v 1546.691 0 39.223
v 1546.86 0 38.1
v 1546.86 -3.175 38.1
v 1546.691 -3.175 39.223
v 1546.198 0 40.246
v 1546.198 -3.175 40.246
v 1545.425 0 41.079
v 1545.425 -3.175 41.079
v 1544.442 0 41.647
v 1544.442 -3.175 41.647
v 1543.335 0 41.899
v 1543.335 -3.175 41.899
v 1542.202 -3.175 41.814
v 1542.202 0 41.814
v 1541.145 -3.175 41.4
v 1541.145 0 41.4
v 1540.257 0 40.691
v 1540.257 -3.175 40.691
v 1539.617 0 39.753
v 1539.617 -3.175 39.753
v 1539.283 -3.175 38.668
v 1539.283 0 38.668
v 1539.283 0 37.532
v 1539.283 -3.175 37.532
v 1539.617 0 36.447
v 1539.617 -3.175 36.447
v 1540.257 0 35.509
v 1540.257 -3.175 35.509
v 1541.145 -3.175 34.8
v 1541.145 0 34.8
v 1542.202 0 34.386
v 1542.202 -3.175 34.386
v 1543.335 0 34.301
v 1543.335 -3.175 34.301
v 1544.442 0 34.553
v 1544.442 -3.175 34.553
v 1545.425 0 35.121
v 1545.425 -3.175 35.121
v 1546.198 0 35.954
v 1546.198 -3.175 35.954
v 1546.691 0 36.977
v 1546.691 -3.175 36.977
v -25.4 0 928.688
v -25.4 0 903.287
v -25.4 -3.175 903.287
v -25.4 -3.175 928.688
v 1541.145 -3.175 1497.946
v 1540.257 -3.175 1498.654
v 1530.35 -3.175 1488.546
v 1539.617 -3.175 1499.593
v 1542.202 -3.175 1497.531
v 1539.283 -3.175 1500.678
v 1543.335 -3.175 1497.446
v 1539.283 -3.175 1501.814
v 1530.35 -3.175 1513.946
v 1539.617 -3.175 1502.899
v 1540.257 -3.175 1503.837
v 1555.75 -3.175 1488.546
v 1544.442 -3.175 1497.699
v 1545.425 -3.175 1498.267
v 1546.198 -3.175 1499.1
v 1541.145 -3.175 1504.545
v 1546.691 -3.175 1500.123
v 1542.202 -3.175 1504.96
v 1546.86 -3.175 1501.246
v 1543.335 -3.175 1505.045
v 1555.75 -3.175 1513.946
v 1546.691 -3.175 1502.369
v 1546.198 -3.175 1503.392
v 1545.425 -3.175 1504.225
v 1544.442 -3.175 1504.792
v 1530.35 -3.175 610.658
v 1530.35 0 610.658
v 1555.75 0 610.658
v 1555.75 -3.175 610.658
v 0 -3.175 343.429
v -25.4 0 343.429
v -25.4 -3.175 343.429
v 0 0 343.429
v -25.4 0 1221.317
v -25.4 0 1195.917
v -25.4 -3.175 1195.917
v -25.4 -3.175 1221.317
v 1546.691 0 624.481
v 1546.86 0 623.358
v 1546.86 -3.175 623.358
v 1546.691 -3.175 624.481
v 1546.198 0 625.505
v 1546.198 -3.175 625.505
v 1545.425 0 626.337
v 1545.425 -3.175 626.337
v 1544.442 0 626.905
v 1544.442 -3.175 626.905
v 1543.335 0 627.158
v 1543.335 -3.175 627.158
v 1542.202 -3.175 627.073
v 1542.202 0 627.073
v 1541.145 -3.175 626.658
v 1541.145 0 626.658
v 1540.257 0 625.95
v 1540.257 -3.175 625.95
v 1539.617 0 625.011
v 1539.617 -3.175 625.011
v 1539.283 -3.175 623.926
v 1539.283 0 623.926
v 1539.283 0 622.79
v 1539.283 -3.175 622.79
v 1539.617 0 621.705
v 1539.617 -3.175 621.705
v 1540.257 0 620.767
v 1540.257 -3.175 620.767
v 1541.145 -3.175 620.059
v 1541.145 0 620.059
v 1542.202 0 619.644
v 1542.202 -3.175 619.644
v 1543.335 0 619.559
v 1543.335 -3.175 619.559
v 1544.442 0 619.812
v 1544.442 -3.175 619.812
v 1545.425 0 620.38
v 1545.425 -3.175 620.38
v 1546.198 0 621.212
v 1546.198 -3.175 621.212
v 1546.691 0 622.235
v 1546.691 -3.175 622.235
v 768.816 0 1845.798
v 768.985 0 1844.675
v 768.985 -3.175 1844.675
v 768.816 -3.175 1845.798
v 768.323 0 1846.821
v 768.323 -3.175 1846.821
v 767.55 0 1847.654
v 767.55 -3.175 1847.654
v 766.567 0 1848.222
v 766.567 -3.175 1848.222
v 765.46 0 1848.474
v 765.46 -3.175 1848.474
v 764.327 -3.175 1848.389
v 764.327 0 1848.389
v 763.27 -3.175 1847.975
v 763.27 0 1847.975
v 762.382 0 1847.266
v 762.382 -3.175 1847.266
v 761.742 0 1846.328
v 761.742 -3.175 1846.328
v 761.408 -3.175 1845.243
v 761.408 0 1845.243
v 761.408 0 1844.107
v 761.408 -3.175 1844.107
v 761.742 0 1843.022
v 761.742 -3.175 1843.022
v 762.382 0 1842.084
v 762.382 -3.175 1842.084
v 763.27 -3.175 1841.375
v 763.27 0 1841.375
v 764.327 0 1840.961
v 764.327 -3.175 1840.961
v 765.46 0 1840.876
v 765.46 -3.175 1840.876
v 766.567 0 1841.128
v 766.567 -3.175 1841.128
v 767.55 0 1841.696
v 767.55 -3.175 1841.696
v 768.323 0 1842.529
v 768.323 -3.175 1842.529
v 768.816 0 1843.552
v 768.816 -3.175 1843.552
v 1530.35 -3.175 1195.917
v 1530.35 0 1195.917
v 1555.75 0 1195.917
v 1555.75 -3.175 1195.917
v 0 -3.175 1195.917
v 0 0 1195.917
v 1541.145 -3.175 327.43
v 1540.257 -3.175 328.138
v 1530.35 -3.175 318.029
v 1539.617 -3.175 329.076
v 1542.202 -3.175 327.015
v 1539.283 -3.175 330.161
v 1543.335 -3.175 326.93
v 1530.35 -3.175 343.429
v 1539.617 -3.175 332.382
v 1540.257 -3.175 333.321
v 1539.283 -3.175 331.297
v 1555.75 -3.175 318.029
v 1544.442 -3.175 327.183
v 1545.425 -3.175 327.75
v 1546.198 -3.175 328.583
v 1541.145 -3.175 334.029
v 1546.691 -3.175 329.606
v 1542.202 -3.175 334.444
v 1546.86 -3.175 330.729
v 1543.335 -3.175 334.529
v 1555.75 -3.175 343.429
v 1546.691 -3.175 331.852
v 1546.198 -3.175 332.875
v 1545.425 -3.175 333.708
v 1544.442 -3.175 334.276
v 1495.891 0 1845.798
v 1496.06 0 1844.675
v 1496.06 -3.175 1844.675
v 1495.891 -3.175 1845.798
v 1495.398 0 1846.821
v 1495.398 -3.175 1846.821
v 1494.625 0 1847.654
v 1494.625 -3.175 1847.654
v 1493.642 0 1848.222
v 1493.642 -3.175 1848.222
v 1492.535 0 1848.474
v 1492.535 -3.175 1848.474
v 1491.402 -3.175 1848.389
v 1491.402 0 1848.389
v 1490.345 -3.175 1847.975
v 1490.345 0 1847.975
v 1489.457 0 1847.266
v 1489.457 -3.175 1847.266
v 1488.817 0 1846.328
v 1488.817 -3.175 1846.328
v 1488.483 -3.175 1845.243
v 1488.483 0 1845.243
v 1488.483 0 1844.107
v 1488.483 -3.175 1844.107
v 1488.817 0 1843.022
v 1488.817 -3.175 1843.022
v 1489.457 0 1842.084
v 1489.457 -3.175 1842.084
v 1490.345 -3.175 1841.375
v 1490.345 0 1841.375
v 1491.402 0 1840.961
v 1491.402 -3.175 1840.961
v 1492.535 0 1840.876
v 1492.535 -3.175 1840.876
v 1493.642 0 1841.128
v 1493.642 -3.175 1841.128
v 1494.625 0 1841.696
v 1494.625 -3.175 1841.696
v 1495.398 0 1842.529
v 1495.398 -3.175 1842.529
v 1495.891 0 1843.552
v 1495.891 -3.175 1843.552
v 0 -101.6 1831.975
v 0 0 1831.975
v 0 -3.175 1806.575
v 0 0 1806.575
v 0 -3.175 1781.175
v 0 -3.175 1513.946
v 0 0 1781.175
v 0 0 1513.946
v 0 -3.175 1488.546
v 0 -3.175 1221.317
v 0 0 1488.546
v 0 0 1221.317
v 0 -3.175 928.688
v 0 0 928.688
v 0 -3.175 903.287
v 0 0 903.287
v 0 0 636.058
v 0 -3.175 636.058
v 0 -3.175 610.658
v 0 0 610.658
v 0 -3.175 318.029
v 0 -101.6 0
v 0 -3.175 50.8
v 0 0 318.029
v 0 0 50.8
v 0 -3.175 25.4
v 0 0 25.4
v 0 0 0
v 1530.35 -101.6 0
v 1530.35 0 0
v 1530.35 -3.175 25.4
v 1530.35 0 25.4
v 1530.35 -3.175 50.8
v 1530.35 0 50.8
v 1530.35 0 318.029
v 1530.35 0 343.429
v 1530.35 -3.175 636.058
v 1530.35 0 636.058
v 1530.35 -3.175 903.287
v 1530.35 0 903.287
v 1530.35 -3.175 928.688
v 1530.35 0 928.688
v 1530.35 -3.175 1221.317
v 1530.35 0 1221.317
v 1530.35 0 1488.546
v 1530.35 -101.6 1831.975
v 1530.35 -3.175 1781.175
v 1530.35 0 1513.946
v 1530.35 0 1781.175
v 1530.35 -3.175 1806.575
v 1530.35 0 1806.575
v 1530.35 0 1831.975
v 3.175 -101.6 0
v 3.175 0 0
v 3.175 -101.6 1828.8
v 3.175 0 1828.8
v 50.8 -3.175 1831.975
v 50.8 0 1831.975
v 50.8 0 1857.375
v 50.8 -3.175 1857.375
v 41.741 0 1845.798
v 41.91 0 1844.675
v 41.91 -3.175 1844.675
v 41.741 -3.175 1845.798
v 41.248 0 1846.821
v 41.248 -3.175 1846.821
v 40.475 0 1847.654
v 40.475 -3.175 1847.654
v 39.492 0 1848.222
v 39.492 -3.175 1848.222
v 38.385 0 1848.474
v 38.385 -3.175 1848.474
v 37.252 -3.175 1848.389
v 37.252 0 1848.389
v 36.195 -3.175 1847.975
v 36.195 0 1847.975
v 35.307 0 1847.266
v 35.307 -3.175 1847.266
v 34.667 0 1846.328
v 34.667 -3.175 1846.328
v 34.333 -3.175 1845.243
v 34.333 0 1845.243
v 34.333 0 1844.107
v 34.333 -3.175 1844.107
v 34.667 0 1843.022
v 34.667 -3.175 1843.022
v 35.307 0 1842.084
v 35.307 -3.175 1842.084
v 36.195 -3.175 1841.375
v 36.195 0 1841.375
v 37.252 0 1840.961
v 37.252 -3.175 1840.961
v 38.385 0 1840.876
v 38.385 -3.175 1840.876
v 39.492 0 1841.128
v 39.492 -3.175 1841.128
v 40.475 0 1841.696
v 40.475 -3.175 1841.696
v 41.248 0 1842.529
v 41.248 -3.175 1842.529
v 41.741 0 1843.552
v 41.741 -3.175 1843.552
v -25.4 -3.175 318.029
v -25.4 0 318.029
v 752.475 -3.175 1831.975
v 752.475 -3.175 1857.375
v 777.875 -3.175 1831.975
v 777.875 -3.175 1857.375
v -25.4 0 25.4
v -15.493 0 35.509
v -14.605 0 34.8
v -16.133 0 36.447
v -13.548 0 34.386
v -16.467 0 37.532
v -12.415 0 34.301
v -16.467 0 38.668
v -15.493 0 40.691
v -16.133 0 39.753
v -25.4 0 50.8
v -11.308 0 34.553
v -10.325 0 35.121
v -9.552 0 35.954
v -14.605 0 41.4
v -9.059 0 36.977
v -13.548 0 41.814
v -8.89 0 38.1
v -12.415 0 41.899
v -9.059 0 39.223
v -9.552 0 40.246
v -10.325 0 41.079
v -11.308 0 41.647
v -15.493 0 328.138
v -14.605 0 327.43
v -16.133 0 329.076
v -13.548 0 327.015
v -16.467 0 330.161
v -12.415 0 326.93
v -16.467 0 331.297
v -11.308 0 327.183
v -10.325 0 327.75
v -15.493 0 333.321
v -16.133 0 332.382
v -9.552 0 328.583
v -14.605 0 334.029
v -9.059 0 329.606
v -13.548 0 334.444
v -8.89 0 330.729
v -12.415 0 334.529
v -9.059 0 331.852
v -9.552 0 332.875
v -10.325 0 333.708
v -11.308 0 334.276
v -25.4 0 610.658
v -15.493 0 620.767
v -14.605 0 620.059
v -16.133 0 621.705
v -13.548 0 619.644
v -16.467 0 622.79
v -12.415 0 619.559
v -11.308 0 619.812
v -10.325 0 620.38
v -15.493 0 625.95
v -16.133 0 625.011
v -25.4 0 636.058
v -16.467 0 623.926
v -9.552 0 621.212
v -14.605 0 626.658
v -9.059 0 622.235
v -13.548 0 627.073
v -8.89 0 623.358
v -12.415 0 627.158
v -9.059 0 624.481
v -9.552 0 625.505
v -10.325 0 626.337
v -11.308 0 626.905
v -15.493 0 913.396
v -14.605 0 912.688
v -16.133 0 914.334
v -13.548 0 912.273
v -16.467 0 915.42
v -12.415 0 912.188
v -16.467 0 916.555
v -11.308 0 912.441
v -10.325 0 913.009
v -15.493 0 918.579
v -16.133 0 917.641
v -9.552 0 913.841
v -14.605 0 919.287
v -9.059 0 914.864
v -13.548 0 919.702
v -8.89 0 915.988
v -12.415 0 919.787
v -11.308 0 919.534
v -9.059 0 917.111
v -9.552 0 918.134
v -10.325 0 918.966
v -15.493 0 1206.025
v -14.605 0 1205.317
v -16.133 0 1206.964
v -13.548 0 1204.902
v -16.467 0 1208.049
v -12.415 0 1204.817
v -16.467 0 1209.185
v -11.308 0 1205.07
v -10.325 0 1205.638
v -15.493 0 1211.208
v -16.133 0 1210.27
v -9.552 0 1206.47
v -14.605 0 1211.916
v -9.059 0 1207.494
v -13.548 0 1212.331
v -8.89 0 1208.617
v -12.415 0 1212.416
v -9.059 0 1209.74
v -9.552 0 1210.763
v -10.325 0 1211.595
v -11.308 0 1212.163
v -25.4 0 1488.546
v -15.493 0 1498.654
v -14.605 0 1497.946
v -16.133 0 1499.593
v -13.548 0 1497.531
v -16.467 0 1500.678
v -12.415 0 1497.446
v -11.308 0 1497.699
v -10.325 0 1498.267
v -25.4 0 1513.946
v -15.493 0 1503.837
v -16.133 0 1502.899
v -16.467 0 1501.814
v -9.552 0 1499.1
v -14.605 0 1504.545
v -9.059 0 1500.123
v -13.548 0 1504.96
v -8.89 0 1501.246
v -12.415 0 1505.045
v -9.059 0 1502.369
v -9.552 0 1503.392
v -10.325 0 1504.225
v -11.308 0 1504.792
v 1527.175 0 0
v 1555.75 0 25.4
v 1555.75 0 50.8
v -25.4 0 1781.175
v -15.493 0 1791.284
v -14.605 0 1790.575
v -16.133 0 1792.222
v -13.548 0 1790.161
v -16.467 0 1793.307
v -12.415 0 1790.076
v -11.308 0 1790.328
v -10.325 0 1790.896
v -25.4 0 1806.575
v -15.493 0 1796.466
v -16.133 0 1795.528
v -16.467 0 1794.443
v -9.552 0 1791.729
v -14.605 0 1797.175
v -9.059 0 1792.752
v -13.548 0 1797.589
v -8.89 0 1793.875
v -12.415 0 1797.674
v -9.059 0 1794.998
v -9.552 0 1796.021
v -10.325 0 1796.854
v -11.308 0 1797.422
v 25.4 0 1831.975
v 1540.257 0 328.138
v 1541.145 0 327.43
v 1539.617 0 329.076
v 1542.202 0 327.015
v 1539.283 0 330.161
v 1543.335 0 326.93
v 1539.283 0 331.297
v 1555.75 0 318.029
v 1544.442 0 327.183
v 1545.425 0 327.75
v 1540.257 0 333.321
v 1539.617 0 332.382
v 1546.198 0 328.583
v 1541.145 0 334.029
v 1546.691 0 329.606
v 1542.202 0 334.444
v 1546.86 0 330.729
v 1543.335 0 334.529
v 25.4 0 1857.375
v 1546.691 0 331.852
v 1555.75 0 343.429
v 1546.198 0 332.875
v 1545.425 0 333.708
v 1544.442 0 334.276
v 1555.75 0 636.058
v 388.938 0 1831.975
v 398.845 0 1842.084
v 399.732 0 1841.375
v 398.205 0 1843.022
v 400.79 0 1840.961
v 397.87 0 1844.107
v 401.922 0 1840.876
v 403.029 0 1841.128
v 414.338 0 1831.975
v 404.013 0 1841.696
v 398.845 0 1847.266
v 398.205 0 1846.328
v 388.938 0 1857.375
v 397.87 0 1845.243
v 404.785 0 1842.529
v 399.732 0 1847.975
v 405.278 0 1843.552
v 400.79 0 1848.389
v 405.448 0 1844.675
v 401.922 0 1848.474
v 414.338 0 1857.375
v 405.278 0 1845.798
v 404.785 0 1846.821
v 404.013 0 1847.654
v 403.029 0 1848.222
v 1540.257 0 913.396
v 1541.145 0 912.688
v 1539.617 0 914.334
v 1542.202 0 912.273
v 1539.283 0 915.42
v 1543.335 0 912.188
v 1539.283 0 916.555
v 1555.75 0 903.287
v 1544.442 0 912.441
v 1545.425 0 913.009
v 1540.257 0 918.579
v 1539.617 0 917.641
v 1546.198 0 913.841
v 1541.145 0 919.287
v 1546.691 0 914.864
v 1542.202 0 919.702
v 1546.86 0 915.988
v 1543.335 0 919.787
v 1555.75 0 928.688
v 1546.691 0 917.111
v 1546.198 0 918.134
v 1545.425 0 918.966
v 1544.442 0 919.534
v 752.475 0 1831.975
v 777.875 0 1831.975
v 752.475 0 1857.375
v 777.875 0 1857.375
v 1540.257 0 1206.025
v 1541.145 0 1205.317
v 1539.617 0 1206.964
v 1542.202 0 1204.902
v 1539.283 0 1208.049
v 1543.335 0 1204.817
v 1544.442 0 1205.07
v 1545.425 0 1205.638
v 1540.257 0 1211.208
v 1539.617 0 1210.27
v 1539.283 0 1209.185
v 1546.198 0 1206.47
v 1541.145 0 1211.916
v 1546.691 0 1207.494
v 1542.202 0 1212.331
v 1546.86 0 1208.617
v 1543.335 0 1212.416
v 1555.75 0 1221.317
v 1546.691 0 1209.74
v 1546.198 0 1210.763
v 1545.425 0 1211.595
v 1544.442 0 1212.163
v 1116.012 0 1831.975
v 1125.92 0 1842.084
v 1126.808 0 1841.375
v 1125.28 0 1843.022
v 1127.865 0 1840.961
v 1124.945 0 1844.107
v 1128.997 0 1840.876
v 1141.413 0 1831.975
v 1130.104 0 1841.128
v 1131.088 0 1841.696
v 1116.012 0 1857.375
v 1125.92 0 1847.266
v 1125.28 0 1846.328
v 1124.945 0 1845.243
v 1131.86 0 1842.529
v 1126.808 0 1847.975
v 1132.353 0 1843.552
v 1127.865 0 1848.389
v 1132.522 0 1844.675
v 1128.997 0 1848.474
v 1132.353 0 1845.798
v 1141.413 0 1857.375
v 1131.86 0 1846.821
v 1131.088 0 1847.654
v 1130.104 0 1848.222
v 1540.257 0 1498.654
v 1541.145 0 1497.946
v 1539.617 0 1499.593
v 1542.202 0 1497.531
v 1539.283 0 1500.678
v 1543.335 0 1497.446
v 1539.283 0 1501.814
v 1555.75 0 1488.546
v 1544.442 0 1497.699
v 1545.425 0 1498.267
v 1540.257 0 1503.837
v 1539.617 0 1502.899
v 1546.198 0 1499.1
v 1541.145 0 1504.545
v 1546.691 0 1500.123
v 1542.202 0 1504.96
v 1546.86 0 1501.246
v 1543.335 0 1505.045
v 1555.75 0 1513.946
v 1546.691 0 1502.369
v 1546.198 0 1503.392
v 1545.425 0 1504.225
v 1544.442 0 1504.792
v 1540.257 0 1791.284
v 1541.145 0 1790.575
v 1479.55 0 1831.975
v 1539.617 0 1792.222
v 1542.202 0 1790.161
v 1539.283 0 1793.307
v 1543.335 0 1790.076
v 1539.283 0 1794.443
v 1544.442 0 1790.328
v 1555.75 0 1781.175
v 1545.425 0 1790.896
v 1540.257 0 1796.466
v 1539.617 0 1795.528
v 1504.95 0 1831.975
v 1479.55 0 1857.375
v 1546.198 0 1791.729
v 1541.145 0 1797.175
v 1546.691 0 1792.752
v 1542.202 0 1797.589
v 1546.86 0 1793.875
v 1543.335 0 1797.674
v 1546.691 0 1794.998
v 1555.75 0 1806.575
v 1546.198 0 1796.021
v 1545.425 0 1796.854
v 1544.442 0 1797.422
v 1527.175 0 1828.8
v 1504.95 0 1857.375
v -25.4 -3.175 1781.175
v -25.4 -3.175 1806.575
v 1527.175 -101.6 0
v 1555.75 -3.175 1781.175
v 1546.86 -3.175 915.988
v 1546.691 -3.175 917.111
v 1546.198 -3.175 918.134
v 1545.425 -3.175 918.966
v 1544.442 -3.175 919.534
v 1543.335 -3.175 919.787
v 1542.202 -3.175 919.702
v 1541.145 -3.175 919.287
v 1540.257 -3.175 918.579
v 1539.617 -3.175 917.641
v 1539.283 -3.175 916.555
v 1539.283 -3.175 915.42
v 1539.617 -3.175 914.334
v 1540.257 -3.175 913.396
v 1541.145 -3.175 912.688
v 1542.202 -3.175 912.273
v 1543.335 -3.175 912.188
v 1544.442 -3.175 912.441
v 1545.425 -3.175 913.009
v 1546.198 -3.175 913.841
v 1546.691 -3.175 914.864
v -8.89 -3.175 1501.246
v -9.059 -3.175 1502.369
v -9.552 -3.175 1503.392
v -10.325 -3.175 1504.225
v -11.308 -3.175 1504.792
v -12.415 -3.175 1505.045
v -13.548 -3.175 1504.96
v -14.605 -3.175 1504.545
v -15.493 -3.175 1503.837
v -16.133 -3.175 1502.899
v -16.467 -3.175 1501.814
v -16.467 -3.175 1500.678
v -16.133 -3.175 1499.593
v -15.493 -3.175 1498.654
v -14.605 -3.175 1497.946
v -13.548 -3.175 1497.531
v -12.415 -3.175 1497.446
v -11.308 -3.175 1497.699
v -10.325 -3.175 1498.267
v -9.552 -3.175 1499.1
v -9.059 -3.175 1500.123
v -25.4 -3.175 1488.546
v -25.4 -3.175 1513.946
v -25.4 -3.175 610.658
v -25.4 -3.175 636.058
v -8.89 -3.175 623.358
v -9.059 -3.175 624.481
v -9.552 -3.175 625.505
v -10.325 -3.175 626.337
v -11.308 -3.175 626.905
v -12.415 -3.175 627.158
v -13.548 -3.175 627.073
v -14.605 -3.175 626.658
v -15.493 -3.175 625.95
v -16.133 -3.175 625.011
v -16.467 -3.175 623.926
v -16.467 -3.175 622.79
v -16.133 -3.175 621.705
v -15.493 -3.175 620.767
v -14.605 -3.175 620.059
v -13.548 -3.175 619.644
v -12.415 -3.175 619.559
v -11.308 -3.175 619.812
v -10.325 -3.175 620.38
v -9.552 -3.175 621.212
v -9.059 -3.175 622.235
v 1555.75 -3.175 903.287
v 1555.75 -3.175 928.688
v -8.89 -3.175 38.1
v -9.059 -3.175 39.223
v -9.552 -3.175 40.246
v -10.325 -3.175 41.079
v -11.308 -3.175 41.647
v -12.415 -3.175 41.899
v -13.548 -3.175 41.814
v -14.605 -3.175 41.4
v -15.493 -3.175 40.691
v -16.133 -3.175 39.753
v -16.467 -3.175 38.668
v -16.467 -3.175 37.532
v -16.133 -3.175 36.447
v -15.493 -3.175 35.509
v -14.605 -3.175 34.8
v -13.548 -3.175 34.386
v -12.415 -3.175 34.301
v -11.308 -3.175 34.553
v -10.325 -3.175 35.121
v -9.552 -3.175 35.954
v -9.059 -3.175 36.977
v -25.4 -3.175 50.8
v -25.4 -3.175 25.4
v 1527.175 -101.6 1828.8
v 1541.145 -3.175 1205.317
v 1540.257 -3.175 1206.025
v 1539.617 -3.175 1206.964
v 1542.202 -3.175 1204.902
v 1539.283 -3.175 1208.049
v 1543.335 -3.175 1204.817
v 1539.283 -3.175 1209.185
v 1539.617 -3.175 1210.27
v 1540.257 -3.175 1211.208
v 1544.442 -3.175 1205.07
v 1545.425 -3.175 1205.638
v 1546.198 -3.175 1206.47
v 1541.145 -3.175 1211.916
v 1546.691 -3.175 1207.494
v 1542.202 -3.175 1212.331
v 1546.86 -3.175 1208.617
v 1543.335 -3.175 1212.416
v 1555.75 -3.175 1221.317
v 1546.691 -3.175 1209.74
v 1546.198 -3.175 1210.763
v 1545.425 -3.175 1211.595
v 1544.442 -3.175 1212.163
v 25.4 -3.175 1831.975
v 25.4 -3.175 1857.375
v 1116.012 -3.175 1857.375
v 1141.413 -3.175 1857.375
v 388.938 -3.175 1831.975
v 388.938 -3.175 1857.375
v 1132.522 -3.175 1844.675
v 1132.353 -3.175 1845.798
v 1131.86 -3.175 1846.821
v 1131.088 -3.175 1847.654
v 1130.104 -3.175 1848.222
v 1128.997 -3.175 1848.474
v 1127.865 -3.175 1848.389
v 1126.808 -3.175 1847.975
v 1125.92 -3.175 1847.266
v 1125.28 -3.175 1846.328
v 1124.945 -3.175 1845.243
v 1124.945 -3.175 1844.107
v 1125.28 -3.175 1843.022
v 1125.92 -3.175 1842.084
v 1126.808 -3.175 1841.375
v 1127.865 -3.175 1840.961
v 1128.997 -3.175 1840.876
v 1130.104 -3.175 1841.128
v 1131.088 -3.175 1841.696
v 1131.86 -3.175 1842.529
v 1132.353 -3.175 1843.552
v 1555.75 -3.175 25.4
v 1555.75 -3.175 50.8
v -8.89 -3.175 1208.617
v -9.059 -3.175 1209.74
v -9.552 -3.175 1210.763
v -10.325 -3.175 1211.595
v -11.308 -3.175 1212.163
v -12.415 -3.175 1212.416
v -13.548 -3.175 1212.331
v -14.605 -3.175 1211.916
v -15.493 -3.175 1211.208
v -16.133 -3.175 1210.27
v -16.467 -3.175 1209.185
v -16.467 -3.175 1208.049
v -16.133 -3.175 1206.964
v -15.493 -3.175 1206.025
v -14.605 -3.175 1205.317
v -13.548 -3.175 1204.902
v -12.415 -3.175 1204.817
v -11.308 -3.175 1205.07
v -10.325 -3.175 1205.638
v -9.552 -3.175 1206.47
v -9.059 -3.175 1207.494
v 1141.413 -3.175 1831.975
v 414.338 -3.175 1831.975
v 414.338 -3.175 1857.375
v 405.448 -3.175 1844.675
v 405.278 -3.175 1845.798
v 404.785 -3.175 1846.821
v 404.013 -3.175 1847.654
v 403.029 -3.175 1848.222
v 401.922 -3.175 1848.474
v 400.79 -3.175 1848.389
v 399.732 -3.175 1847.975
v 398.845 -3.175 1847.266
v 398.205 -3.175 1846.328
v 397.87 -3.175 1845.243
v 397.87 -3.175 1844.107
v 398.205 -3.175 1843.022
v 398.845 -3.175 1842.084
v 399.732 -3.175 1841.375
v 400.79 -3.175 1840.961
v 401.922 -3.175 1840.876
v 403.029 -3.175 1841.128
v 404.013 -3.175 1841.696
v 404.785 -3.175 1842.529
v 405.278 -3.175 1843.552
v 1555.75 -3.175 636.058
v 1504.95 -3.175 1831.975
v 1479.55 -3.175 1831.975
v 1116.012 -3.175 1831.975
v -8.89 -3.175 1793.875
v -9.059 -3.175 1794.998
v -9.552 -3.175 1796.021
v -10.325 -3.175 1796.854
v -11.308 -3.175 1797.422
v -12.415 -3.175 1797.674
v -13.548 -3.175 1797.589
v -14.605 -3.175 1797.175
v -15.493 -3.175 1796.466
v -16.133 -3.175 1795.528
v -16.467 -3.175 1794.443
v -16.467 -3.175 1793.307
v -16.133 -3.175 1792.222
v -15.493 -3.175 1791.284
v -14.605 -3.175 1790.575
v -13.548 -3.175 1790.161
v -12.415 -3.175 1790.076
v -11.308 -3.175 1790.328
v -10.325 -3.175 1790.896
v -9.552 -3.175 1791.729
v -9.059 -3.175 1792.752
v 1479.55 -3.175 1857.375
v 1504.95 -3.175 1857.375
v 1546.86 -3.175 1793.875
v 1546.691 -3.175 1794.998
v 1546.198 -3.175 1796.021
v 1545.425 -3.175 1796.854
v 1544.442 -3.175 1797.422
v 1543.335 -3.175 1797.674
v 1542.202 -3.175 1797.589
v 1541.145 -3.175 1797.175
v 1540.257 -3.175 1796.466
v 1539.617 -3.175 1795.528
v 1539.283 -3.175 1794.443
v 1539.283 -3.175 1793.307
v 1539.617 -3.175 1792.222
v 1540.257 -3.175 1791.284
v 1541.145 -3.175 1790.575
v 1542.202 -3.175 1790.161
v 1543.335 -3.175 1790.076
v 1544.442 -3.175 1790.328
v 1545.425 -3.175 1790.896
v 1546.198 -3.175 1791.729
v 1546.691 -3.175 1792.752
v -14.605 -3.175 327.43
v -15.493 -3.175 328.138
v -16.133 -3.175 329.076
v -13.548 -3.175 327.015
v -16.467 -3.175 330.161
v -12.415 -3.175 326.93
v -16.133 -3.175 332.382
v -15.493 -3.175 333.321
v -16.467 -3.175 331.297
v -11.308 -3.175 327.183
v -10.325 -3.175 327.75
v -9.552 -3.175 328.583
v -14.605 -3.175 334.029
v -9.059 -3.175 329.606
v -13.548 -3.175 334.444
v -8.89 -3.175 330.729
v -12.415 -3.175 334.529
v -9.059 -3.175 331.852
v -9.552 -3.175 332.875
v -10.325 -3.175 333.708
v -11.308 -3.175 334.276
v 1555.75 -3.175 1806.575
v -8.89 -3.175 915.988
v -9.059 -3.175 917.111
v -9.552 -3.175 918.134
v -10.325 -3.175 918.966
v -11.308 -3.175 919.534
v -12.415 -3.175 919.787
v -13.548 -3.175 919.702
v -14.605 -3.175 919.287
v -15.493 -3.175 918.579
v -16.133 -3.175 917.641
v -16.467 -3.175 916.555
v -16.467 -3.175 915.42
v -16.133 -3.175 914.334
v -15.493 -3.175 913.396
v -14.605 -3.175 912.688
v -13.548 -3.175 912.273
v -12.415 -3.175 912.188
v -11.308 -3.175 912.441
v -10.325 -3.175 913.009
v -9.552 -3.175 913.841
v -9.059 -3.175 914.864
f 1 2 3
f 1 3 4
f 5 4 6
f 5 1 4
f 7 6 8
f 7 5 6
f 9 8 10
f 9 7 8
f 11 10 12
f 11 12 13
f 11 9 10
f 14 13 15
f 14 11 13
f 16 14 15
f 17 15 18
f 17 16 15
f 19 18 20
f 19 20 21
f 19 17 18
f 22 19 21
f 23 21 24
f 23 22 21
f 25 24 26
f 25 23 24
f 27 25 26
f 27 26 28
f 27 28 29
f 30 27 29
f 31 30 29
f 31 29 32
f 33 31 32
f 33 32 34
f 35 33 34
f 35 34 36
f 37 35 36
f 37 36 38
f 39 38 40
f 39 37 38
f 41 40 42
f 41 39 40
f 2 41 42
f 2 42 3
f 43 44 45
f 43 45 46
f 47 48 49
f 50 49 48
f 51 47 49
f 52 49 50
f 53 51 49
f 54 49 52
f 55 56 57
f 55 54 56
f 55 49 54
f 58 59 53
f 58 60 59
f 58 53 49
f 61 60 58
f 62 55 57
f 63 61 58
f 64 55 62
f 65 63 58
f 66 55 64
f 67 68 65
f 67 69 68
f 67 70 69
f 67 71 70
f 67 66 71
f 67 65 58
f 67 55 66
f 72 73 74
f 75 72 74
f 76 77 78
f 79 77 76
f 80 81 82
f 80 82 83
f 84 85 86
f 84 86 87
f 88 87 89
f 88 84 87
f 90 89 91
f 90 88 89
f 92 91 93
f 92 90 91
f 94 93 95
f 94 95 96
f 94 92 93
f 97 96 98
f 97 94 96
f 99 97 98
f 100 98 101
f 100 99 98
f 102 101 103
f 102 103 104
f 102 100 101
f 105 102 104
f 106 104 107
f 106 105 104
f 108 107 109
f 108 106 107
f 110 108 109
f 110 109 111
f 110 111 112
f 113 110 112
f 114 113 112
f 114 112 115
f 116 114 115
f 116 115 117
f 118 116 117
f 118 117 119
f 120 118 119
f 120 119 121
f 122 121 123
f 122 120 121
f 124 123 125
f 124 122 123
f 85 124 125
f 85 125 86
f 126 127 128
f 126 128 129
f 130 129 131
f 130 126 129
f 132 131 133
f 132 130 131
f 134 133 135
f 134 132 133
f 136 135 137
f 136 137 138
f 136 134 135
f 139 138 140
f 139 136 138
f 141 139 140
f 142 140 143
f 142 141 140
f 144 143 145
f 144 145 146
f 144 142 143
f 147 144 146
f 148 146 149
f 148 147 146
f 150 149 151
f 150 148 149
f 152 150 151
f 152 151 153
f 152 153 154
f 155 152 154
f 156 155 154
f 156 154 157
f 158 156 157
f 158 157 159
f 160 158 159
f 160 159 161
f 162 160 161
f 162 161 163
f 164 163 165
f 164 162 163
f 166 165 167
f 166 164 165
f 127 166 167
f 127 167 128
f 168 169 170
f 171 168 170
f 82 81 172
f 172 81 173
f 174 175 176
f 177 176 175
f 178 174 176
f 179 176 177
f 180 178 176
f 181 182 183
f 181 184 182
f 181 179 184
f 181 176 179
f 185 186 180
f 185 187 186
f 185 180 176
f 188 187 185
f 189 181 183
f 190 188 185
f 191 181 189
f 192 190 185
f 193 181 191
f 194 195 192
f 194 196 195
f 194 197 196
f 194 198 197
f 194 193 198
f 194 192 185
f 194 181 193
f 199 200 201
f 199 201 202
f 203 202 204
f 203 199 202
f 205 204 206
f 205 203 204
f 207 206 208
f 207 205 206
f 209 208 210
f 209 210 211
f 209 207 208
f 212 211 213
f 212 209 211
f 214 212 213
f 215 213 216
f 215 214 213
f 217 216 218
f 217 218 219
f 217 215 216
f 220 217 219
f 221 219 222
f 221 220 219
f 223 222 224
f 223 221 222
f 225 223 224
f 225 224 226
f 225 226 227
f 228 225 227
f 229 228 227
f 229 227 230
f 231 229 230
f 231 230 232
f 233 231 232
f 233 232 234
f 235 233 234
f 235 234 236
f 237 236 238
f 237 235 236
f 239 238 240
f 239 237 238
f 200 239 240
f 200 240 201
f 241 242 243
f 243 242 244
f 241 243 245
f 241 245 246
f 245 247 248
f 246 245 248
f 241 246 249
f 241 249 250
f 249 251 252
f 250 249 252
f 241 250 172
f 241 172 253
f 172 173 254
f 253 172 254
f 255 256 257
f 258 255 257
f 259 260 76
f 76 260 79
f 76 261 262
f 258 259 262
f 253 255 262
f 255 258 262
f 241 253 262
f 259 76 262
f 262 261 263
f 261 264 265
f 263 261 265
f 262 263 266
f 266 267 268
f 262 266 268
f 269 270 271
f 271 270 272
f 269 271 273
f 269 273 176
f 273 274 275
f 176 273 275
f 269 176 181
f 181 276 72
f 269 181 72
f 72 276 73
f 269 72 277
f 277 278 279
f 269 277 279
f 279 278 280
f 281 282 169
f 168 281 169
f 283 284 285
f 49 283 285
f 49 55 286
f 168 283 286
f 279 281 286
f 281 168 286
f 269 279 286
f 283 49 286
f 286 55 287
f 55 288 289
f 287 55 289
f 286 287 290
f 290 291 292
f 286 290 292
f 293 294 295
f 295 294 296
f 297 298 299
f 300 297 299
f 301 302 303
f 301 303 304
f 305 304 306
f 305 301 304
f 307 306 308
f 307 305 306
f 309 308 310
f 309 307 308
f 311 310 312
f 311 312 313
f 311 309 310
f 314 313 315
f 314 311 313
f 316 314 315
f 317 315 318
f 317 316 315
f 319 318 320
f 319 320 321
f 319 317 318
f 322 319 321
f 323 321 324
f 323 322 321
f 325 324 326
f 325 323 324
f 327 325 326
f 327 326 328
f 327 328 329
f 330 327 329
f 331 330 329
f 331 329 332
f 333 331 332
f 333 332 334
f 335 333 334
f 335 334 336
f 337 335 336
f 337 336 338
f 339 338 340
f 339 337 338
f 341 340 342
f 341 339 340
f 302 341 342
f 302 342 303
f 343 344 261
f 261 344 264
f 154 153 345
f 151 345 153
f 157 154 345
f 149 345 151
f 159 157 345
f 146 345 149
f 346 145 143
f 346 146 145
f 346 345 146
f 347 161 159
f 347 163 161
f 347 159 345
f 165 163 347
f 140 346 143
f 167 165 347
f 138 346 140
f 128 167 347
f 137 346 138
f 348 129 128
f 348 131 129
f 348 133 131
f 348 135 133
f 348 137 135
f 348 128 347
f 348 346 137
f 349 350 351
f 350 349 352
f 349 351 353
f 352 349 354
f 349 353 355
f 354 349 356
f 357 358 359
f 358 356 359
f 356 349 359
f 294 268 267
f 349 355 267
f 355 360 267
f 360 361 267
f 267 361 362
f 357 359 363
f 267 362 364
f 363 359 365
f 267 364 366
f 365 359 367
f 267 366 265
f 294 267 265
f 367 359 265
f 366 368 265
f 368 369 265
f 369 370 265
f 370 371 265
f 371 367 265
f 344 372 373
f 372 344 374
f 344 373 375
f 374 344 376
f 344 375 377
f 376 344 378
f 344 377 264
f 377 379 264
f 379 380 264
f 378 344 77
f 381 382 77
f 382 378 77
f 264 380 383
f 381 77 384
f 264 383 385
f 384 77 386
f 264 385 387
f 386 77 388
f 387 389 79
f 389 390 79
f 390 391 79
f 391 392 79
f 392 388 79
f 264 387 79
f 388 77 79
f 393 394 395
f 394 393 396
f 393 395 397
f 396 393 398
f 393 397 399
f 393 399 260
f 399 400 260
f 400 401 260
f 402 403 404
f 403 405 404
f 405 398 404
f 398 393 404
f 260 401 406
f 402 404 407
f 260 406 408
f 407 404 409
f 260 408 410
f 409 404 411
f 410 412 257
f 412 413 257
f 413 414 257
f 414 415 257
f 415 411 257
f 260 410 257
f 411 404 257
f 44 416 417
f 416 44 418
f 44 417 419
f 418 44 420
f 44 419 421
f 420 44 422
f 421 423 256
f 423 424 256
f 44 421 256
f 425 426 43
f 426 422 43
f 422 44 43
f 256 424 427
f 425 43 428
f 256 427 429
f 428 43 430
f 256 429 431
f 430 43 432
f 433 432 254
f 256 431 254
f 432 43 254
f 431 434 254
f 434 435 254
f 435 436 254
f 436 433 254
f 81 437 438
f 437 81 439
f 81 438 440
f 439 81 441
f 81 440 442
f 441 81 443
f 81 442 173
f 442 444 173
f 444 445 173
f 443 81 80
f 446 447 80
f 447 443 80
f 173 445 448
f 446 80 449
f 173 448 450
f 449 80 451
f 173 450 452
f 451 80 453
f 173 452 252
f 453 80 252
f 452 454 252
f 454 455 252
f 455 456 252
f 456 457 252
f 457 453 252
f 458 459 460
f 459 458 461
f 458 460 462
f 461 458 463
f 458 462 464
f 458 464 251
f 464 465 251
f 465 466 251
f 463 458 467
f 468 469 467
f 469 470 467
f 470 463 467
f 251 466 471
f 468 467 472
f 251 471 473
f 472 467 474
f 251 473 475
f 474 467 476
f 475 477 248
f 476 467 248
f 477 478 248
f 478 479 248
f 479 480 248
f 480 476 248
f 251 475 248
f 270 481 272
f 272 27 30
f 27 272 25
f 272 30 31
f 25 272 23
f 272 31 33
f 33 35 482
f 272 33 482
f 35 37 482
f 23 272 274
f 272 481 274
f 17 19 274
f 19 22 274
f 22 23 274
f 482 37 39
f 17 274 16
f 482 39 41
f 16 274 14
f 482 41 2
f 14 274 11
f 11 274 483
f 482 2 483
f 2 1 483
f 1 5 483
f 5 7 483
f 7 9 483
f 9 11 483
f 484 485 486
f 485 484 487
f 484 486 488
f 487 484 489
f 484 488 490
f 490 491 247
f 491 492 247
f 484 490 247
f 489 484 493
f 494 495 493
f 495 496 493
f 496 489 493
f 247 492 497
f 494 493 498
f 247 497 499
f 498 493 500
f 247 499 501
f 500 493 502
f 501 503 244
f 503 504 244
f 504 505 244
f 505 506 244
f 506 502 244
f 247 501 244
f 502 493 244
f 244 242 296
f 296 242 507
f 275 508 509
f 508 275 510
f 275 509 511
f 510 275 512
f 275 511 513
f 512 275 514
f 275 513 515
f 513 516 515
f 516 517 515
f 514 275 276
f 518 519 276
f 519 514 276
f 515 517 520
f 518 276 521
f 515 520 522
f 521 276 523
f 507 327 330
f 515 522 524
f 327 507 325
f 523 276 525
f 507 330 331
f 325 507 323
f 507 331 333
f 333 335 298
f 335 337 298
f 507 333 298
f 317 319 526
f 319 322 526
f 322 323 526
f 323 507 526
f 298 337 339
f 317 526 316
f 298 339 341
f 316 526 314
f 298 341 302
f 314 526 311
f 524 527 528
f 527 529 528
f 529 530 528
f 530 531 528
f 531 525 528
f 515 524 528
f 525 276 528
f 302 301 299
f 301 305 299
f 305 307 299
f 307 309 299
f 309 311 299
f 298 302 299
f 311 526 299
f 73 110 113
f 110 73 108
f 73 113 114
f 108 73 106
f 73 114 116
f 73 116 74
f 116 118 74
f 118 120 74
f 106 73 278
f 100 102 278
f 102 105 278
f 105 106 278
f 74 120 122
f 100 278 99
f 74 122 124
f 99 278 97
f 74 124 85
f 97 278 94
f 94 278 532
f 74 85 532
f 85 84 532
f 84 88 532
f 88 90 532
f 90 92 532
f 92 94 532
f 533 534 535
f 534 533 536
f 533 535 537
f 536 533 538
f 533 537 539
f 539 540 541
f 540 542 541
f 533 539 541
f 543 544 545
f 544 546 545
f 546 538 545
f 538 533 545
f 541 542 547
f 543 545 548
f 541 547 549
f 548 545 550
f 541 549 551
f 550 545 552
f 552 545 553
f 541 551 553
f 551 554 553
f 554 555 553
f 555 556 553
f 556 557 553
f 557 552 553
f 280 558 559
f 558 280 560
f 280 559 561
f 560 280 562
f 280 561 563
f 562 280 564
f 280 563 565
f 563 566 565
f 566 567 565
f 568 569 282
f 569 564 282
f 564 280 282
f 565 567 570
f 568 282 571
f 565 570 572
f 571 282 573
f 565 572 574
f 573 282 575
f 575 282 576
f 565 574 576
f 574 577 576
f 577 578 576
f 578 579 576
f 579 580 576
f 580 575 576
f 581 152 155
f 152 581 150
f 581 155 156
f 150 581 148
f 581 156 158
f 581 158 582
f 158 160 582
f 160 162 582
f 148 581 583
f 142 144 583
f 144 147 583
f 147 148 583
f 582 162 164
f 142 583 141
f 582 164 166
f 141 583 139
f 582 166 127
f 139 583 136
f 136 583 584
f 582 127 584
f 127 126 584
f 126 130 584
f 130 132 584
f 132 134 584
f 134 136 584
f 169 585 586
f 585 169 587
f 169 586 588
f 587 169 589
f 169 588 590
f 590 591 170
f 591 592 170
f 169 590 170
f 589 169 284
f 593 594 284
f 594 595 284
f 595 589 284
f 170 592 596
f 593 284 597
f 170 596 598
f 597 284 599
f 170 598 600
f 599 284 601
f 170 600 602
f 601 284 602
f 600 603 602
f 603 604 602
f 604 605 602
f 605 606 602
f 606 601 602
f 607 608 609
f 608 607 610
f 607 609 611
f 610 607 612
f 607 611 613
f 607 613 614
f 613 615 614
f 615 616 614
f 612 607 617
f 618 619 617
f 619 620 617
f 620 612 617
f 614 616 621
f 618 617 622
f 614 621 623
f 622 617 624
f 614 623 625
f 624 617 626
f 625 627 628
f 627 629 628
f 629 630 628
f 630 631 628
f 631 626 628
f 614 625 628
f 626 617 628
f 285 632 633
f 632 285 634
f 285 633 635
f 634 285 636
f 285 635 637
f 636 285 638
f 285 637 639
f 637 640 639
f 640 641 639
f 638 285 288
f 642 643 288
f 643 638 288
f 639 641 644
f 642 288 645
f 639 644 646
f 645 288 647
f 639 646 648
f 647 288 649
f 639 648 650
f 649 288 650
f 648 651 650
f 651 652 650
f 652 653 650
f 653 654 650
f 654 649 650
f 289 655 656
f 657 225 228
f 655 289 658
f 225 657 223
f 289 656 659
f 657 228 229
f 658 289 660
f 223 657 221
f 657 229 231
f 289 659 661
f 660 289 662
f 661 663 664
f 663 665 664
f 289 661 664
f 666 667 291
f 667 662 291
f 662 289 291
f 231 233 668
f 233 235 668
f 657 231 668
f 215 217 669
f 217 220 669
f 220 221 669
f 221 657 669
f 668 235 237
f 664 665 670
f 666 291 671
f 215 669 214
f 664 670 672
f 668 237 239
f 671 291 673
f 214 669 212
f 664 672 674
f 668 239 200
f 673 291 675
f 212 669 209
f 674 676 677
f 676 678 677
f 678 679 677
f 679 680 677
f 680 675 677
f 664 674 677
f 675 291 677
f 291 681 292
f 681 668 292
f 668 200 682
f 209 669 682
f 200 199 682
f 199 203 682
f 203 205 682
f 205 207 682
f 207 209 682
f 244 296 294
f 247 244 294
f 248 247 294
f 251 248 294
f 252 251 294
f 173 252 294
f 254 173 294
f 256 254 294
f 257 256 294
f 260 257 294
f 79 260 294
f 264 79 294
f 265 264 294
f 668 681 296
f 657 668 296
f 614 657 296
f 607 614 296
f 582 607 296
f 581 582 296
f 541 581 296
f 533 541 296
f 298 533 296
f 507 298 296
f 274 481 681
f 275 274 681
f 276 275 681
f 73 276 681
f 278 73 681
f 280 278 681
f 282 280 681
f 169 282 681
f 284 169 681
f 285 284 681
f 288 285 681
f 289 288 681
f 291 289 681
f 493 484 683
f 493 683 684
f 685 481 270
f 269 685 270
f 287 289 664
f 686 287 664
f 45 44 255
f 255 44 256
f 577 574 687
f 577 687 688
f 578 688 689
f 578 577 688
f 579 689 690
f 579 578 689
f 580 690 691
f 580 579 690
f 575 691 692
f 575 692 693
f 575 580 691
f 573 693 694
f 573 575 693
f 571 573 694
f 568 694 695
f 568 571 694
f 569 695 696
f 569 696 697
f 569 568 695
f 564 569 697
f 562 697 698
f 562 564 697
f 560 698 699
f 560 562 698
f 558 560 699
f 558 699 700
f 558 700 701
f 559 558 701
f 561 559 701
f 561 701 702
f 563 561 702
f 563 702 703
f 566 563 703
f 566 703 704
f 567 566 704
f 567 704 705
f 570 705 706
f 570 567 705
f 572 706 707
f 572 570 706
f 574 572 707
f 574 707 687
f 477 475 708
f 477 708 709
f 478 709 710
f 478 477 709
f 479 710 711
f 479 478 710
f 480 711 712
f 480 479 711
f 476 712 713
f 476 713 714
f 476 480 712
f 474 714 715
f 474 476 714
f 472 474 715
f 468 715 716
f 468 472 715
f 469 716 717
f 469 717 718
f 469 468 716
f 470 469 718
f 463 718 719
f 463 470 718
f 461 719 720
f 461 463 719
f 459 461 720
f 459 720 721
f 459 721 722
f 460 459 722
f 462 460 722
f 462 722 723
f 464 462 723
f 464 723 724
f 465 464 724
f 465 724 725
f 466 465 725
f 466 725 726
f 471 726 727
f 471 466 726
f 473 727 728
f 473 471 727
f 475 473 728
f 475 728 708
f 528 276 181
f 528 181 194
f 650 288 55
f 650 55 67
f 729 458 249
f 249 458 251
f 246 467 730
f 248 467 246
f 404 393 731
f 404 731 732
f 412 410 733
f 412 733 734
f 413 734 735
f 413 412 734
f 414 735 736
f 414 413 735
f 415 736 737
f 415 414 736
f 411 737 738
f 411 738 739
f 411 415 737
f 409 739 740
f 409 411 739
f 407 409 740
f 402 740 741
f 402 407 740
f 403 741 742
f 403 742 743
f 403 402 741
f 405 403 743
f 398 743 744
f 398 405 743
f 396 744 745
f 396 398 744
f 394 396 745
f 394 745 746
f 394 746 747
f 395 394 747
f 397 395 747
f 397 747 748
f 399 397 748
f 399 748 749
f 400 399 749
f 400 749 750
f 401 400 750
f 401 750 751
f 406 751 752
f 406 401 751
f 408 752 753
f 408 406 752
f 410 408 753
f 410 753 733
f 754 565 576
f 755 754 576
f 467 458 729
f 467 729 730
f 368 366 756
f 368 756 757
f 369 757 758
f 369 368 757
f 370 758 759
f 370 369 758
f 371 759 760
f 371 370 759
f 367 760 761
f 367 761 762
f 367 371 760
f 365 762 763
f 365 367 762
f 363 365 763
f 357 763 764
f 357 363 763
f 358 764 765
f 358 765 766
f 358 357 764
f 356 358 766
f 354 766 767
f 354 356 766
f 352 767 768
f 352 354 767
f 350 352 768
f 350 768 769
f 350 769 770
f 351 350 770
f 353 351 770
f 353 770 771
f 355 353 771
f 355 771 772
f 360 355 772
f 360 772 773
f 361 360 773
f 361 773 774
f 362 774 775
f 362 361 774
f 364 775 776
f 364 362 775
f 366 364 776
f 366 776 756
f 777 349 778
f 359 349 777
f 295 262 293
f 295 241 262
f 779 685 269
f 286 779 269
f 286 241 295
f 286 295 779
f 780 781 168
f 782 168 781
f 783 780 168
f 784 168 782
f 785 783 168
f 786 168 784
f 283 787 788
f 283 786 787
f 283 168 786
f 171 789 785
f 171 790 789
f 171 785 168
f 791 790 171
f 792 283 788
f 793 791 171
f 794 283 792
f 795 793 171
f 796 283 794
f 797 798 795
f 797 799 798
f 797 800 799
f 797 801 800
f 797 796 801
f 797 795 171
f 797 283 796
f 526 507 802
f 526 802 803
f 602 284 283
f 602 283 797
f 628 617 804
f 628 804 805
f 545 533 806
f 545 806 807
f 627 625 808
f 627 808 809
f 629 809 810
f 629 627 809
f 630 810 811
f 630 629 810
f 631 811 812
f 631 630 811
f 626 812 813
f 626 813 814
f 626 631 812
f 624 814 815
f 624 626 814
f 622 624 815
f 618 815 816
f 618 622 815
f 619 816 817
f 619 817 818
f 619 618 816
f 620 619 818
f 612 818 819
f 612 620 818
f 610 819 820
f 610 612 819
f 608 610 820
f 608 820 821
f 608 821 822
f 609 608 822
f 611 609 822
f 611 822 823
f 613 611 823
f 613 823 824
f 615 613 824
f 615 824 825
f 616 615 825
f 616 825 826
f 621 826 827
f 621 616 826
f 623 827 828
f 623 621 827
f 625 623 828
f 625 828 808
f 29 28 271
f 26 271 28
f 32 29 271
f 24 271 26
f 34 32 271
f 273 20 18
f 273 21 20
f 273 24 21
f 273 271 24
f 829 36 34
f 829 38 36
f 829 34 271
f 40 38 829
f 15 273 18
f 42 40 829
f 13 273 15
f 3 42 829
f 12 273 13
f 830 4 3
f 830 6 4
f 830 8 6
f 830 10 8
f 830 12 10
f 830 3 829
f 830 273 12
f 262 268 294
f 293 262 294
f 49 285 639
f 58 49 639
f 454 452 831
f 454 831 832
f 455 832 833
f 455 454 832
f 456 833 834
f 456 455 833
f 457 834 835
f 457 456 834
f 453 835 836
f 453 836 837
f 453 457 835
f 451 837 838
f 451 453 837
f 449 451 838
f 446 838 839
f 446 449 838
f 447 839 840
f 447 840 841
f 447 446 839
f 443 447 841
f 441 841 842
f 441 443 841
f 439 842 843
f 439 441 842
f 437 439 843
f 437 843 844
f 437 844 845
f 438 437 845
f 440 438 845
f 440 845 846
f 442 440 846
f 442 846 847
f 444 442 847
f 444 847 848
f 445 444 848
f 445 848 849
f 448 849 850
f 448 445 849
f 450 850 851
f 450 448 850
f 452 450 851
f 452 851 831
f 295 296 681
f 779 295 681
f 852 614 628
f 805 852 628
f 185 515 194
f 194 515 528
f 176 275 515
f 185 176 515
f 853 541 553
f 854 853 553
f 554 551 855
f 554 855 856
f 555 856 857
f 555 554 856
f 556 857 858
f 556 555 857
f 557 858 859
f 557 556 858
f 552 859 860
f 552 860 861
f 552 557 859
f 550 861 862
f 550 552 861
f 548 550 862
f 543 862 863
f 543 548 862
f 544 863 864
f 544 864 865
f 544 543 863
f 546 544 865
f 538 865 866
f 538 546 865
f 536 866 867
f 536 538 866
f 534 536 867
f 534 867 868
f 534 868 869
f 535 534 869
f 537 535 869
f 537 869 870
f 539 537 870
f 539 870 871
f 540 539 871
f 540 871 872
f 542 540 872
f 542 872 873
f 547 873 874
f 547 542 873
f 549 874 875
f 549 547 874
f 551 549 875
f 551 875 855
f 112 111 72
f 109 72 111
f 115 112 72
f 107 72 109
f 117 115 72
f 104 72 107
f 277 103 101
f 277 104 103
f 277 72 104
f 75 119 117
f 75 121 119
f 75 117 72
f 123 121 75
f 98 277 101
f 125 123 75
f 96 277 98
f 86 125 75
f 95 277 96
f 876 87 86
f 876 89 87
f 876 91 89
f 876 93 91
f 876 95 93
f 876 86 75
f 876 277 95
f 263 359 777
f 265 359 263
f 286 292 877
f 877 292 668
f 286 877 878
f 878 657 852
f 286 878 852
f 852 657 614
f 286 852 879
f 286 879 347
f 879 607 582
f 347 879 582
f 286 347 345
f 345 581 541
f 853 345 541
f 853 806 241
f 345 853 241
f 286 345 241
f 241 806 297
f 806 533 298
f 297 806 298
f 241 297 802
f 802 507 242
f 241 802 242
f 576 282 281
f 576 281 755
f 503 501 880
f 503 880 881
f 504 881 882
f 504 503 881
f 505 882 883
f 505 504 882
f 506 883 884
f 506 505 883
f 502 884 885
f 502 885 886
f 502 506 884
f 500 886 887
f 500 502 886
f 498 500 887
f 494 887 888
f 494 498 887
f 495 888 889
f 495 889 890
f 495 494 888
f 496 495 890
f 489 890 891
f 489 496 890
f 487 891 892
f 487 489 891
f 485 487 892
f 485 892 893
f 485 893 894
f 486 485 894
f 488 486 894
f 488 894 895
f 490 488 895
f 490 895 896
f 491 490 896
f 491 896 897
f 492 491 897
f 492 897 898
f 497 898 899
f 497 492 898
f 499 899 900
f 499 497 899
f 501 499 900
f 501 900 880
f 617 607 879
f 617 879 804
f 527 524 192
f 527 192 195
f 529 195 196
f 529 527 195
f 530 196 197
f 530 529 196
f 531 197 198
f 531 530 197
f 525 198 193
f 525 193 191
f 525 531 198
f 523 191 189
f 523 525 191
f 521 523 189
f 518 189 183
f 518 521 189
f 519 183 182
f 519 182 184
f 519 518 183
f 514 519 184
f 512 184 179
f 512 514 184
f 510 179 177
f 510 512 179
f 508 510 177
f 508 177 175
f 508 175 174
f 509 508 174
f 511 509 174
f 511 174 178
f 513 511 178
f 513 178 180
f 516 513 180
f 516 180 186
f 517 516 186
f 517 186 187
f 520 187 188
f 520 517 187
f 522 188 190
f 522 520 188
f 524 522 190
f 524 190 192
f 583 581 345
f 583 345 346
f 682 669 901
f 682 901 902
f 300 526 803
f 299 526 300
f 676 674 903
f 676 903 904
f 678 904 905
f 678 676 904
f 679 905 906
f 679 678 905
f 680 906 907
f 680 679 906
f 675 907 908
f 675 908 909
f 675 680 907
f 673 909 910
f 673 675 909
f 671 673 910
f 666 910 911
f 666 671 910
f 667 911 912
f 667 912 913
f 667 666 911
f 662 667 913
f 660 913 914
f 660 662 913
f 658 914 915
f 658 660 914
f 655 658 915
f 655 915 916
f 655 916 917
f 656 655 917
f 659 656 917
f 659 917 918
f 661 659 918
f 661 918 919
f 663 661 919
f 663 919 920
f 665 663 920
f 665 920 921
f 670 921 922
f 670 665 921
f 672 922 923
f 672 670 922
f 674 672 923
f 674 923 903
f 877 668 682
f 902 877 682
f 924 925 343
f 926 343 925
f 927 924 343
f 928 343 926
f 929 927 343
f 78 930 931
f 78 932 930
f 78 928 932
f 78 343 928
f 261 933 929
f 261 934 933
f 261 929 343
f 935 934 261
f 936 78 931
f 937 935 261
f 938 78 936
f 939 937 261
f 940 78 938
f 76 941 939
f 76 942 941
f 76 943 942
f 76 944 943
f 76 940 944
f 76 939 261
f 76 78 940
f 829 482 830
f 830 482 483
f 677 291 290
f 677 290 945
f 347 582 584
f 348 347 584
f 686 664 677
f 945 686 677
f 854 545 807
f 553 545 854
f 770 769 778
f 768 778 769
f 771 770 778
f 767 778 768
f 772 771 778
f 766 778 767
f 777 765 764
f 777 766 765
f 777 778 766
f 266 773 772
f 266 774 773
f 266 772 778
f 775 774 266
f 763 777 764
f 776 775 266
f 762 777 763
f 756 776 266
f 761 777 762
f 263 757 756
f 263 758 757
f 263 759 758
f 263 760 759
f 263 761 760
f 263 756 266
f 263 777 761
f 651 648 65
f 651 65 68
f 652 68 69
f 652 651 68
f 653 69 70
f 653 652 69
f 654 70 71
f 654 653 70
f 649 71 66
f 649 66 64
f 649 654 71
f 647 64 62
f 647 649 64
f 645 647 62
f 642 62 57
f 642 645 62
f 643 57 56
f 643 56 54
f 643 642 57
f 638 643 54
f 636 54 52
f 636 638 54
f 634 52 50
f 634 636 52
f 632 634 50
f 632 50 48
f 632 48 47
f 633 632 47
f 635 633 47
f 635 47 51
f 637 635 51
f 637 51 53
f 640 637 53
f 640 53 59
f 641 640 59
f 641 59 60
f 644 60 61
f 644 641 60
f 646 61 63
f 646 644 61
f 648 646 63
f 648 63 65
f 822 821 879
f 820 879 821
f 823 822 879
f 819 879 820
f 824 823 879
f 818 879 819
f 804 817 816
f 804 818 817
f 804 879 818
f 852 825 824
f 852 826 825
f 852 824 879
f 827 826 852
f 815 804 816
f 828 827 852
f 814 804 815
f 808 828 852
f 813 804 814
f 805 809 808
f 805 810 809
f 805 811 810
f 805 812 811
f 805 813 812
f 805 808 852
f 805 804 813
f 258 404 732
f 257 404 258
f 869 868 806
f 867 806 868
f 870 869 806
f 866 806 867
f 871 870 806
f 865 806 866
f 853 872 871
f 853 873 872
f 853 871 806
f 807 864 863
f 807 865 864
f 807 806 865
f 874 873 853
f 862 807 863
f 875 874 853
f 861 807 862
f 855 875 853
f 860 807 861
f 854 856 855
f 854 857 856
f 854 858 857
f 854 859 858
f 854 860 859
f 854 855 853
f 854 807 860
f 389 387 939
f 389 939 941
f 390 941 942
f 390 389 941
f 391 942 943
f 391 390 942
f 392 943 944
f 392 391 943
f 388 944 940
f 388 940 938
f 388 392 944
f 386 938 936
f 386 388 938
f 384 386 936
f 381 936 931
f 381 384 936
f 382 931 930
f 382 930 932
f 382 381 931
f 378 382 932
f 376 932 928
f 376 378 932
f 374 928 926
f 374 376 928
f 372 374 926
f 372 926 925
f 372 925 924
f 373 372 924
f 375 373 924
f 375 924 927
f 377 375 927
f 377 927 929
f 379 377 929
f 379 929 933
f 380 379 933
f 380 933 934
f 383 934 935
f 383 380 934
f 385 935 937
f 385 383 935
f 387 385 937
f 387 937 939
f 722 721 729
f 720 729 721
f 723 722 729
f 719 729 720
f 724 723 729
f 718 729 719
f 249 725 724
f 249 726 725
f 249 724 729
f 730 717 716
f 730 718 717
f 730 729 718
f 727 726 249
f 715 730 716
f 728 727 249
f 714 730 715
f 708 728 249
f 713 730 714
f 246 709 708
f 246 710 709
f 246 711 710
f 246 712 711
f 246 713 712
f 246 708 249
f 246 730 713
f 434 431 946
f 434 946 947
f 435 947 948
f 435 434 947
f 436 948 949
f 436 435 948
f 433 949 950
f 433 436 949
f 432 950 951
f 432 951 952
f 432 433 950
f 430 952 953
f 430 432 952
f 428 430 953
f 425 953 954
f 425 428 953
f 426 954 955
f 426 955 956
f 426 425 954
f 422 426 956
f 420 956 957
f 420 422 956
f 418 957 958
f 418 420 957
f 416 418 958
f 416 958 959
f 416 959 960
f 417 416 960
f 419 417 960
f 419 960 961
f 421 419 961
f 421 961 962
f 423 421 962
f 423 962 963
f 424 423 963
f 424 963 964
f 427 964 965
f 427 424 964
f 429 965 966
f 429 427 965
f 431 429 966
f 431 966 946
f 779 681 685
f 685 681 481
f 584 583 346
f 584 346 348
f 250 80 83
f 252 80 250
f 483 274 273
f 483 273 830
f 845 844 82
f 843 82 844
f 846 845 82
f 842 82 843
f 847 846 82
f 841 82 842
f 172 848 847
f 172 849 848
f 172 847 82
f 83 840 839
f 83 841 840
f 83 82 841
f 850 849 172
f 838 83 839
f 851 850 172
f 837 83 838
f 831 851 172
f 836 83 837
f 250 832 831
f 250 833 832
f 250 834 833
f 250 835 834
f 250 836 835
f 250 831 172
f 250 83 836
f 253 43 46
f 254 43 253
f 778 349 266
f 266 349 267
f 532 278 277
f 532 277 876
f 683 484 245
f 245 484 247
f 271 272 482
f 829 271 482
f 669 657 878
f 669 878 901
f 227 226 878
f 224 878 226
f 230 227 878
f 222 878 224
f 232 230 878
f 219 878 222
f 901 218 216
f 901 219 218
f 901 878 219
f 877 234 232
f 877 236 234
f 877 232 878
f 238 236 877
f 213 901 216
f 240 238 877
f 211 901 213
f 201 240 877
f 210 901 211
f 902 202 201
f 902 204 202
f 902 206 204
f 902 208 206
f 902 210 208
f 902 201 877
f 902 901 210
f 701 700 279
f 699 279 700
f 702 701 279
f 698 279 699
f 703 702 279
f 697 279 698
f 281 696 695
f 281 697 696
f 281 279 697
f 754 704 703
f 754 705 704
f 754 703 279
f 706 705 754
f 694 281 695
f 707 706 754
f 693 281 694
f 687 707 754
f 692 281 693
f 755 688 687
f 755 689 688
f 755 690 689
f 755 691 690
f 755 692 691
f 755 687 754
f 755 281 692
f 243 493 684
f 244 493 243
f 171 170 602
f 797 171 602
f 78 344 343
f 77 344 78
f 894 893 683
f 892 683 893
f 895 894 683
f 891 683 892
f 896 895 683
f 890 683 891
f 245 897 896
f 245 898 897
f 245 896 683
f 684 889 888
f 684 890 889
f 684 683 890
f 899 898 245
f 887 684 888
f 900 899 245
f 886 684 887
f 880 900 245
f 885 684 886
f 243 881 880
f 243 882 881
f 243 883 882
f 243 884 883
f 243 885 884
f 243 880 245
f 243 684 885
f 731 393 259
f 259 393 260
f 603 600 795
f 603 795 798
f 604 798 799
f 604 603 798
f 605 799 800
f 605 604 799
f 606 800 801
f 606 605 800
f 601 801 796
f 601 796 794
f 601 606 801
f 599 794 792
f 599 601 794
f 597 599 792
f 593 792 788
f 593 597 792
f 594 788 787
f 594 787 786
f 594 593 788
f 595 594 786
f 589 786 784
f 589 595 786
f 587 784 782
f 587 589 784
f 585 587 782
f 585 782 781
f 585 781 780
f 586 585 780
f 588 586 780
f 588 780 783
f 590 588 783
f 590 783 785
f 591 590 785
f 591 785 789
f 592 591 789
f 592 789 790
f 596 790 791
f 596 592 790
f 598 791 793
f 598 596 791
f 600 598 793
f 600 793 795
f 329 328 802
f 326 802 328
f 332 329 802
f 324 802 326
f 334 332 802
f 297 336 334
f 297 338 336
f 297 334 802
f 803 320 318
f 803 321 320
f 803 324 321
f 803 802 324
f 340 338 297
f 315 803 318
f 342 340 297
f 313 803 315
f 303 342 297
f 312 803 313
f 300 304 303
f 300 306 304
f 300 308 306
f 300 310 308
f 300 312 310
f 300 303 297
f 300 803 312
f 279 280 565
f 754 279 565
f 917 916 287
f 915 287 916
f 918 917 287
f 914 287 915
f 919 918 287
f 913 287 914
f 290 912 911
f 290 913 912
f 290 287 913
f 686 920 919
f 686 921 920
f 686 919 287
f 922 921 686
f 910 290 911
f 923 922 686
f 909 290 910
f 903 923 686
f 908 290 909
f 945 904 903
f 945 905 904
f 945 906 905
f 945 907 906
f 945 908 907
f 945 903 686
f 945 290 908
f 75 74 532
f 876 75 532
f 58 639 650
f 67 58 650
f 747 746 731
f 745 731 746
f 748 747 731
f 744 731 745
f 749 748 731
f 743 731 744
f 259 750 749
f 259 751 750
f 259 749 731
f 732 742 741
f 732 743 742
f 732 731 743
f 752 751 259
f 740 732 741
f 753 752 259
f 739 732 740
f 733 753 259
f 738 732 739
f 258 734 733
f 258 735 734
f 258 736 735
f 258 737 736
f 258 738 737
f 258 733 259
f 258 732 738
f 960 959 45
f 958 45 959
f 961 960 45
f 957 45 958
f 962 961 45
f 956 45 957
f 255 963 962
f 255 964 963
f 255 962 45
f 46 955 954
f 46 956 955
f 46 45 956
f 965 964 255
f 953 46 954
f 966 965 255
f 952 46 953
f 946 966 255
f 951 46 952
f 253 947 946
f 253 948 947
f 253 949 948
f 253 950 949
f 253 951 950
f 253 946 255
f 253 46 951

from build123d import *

# Parameters (mm, degrees)
F1_DEPTH = 101.6
F0_W     = 25.4
F0_H     = 25.4
F0_R     = 3.81
F2_DEPTH = 3.175


# Not quite as in the source:
# - a feature names something its author has since deleted; it is built from what else it names


with BuildPart() as f1:
    # F0 (on Front) → F1 (new body)
    with BuildSketch(Plane.XZ):
        Polygon((0, 25.4), (0, 0), (3.175, 0), (3.175, 1828.8), (1527.175, 1828.8), (1527.175, 0), (1530.35, 0), (1530.35, 25.4), (1530.35, 50.8), (1530.35, 318.0291666667), (1530.35, 343.4291666667), (1530.35, 610.6583333333), (1530.35, 636.0583333333), (1530.35, 903.2875), (1530.35, 928.6875), (1530.35, 1195.9166666667), (1530.35, 1221.3166666667), (1530.35, 1488.5458333333), (1530.35, 1513.9458333333), (1530.35, 1781.175), (1530.35, 1806.575), (1530.35, 1831.975), (1504.95, 1831.975), (1479.55, 1831.975), (1141.4125, 1831.975), (1116.0125, 1831.975), (777.875, 1831.975), (752.475, 1831.975), (414.3375, 1831.975), (388.9375, 1831.975), (50.8, 1831.975), (25.4, 1831.975), (0, 1831.975), (0, 1806.575), (0, 1781.175), (0, 1513.9458333333), (0, 1488.5458333333), (0, 1221.3166666667), (0, 1195.9166666667), (0, 928.6875), (0, 903.2875), (0, 636.0583333333), (0, 610.6583333333), (0, 343.4291666667), (0, 318.0291666667), (0, 50.8), align=None)
    extrude(amount=F1_DEPTH)

    # F0 (on Front) → F2 (join)
    with BuildSketch(Plane.XZ):
        with Locations((-12.7, 38.1)):
            Rectangle(F0_W, F0_H)
        with Locations((-12.7, 38.1)):
            Circle(F0_R, mode=Mode.SUBTRACT)
        with Locations((-12.7, 330.7291666667)):
            Rectangle(F0_W, F0_H)
        with Locations((-12.7, 330.7291666667)):
            Circle(F0_R, mode=Mode.SUBTRACT)
        with Locations((-12.7, 623.3583333333)):
            Rectangle(F0_W, F0_H)
        with Locations((-12.7, 623.3583333333)):
            Circle(F0_R, mode=Mode.SUBTRACT)
        with Locations((1543.05, 38.1)):
            Rectangle(F0_W, F0_H)
        with Locations((1543.05, 38.1)):
            Circle(F0_R, mode=Mode.SUBTRACT)
        with Locations((-12.7, 915.9875)):
            Rectangle(F0_W, F0_H)
        with Locations((-12.7, 915.9875)):
            Circle(F0_R, mode=Mode.SUBTRACT)
        with Locations((1543.05, 330.7291666667)):
            Rectangle(F0_W, F0_H)
        with Locations((1543.05, 330.7291666667)):
            Circle(F0_R, mode=Mode.SUBTRACT)
        with Locations((-12.7, 1208.6166666667)):
            Rectangle(F0_W, F0_H)
        with Locations((-12.7, 1208.6166666667)):
            Circle(F0_R, mode=Mode.SUBTRACT)
        with Locations((1543.05, 623.3583333333)):
            Rectangle(F0_W, F0_H)
        with Locations((1543.05, 623.3583333333)):
            Circle(F0_R, mode=Mode.SUBTRACT)
        with Locations((-12.7, 1501.2458333333)):
            Rectangle(F0_W, F0_H)
        with Locations((-12.7, 1501.2458333333)):
            Circle(F0_R, mode=Mode.SUBTRACT)
        with Locations((1543.05, 915.9875)):
            Rectangle(F0_W, F0_H)
        with Locations((1543.05, 915.9875)):
            Circle(F0_R, mode=Mode.SUBTRACT)
        with Locations((-12.7, 1793.875)):
            Rectangle(F0_W, F0_H)
        with Locations((-12.7, 1793.875)):
            Circle(F0_R, mode=Mode.SUBTRACT)
        with Locations((1543.05, 1208.6166666667)):
            Rectangle(F0_W, F0_H)
        with Locations((1543.05, 1208.6166666667)):
            Circle(F0_R, mode=Mode.SUBTRACT)
        with Locations((38.1, 1844.675)):
            Rectangle(F0_W, F0_H)
        with Locations((38.1, 1844.675)):
            Circle(F0_R, mode=Mode.SUBTRACT)
        with Locations((1543.05, 1501.2458333333)):
            Rectangle(F0_W, F0_H)
        with Locations((1543.05, 1501.2458333333)):
            Circle(F0_R, mode=Mode.SUBTRACT)
        with Locations((401.6375, 1844.675)):
            Rectangle(F0_W, F0_H)
        with Locations((401.6375, 1844.675)):
            Circle(F0_R, mode=Mode.SUBTRACT)
        with Locations((1543.05, 1793.875)):
            Rectangle(F0_W, F0_H)
        with Locations((1543.05, 1793.875)):
            Circle(F0_R, mode=Mode.SUBTRACT)
        with Locations((765.175, 1844.675)):
            Rectangle(F0_W, F0_H)
        with Locations((765.175, 1844.675)):
            Circle(F0_R, mode=Mode.SUBTRACT)
        with Locations((1492.25, 1844.675)):
            Rectangle(F0_W, F0_H)
        with Locations((1492.25, 1844.675)):
            Circle(F0_R, mode=Mode.SUBTRACT)
        with Locations((1128.7125, 1844.675)):
            Rectangle(F0_W, F0_H)
        with Locations((1128.7125, 1844.675)):
            Circle(F0_R, mode=Mode.SUBTRACT)
    extrude(amount=F2_DEPTH)


solid = f1.part
